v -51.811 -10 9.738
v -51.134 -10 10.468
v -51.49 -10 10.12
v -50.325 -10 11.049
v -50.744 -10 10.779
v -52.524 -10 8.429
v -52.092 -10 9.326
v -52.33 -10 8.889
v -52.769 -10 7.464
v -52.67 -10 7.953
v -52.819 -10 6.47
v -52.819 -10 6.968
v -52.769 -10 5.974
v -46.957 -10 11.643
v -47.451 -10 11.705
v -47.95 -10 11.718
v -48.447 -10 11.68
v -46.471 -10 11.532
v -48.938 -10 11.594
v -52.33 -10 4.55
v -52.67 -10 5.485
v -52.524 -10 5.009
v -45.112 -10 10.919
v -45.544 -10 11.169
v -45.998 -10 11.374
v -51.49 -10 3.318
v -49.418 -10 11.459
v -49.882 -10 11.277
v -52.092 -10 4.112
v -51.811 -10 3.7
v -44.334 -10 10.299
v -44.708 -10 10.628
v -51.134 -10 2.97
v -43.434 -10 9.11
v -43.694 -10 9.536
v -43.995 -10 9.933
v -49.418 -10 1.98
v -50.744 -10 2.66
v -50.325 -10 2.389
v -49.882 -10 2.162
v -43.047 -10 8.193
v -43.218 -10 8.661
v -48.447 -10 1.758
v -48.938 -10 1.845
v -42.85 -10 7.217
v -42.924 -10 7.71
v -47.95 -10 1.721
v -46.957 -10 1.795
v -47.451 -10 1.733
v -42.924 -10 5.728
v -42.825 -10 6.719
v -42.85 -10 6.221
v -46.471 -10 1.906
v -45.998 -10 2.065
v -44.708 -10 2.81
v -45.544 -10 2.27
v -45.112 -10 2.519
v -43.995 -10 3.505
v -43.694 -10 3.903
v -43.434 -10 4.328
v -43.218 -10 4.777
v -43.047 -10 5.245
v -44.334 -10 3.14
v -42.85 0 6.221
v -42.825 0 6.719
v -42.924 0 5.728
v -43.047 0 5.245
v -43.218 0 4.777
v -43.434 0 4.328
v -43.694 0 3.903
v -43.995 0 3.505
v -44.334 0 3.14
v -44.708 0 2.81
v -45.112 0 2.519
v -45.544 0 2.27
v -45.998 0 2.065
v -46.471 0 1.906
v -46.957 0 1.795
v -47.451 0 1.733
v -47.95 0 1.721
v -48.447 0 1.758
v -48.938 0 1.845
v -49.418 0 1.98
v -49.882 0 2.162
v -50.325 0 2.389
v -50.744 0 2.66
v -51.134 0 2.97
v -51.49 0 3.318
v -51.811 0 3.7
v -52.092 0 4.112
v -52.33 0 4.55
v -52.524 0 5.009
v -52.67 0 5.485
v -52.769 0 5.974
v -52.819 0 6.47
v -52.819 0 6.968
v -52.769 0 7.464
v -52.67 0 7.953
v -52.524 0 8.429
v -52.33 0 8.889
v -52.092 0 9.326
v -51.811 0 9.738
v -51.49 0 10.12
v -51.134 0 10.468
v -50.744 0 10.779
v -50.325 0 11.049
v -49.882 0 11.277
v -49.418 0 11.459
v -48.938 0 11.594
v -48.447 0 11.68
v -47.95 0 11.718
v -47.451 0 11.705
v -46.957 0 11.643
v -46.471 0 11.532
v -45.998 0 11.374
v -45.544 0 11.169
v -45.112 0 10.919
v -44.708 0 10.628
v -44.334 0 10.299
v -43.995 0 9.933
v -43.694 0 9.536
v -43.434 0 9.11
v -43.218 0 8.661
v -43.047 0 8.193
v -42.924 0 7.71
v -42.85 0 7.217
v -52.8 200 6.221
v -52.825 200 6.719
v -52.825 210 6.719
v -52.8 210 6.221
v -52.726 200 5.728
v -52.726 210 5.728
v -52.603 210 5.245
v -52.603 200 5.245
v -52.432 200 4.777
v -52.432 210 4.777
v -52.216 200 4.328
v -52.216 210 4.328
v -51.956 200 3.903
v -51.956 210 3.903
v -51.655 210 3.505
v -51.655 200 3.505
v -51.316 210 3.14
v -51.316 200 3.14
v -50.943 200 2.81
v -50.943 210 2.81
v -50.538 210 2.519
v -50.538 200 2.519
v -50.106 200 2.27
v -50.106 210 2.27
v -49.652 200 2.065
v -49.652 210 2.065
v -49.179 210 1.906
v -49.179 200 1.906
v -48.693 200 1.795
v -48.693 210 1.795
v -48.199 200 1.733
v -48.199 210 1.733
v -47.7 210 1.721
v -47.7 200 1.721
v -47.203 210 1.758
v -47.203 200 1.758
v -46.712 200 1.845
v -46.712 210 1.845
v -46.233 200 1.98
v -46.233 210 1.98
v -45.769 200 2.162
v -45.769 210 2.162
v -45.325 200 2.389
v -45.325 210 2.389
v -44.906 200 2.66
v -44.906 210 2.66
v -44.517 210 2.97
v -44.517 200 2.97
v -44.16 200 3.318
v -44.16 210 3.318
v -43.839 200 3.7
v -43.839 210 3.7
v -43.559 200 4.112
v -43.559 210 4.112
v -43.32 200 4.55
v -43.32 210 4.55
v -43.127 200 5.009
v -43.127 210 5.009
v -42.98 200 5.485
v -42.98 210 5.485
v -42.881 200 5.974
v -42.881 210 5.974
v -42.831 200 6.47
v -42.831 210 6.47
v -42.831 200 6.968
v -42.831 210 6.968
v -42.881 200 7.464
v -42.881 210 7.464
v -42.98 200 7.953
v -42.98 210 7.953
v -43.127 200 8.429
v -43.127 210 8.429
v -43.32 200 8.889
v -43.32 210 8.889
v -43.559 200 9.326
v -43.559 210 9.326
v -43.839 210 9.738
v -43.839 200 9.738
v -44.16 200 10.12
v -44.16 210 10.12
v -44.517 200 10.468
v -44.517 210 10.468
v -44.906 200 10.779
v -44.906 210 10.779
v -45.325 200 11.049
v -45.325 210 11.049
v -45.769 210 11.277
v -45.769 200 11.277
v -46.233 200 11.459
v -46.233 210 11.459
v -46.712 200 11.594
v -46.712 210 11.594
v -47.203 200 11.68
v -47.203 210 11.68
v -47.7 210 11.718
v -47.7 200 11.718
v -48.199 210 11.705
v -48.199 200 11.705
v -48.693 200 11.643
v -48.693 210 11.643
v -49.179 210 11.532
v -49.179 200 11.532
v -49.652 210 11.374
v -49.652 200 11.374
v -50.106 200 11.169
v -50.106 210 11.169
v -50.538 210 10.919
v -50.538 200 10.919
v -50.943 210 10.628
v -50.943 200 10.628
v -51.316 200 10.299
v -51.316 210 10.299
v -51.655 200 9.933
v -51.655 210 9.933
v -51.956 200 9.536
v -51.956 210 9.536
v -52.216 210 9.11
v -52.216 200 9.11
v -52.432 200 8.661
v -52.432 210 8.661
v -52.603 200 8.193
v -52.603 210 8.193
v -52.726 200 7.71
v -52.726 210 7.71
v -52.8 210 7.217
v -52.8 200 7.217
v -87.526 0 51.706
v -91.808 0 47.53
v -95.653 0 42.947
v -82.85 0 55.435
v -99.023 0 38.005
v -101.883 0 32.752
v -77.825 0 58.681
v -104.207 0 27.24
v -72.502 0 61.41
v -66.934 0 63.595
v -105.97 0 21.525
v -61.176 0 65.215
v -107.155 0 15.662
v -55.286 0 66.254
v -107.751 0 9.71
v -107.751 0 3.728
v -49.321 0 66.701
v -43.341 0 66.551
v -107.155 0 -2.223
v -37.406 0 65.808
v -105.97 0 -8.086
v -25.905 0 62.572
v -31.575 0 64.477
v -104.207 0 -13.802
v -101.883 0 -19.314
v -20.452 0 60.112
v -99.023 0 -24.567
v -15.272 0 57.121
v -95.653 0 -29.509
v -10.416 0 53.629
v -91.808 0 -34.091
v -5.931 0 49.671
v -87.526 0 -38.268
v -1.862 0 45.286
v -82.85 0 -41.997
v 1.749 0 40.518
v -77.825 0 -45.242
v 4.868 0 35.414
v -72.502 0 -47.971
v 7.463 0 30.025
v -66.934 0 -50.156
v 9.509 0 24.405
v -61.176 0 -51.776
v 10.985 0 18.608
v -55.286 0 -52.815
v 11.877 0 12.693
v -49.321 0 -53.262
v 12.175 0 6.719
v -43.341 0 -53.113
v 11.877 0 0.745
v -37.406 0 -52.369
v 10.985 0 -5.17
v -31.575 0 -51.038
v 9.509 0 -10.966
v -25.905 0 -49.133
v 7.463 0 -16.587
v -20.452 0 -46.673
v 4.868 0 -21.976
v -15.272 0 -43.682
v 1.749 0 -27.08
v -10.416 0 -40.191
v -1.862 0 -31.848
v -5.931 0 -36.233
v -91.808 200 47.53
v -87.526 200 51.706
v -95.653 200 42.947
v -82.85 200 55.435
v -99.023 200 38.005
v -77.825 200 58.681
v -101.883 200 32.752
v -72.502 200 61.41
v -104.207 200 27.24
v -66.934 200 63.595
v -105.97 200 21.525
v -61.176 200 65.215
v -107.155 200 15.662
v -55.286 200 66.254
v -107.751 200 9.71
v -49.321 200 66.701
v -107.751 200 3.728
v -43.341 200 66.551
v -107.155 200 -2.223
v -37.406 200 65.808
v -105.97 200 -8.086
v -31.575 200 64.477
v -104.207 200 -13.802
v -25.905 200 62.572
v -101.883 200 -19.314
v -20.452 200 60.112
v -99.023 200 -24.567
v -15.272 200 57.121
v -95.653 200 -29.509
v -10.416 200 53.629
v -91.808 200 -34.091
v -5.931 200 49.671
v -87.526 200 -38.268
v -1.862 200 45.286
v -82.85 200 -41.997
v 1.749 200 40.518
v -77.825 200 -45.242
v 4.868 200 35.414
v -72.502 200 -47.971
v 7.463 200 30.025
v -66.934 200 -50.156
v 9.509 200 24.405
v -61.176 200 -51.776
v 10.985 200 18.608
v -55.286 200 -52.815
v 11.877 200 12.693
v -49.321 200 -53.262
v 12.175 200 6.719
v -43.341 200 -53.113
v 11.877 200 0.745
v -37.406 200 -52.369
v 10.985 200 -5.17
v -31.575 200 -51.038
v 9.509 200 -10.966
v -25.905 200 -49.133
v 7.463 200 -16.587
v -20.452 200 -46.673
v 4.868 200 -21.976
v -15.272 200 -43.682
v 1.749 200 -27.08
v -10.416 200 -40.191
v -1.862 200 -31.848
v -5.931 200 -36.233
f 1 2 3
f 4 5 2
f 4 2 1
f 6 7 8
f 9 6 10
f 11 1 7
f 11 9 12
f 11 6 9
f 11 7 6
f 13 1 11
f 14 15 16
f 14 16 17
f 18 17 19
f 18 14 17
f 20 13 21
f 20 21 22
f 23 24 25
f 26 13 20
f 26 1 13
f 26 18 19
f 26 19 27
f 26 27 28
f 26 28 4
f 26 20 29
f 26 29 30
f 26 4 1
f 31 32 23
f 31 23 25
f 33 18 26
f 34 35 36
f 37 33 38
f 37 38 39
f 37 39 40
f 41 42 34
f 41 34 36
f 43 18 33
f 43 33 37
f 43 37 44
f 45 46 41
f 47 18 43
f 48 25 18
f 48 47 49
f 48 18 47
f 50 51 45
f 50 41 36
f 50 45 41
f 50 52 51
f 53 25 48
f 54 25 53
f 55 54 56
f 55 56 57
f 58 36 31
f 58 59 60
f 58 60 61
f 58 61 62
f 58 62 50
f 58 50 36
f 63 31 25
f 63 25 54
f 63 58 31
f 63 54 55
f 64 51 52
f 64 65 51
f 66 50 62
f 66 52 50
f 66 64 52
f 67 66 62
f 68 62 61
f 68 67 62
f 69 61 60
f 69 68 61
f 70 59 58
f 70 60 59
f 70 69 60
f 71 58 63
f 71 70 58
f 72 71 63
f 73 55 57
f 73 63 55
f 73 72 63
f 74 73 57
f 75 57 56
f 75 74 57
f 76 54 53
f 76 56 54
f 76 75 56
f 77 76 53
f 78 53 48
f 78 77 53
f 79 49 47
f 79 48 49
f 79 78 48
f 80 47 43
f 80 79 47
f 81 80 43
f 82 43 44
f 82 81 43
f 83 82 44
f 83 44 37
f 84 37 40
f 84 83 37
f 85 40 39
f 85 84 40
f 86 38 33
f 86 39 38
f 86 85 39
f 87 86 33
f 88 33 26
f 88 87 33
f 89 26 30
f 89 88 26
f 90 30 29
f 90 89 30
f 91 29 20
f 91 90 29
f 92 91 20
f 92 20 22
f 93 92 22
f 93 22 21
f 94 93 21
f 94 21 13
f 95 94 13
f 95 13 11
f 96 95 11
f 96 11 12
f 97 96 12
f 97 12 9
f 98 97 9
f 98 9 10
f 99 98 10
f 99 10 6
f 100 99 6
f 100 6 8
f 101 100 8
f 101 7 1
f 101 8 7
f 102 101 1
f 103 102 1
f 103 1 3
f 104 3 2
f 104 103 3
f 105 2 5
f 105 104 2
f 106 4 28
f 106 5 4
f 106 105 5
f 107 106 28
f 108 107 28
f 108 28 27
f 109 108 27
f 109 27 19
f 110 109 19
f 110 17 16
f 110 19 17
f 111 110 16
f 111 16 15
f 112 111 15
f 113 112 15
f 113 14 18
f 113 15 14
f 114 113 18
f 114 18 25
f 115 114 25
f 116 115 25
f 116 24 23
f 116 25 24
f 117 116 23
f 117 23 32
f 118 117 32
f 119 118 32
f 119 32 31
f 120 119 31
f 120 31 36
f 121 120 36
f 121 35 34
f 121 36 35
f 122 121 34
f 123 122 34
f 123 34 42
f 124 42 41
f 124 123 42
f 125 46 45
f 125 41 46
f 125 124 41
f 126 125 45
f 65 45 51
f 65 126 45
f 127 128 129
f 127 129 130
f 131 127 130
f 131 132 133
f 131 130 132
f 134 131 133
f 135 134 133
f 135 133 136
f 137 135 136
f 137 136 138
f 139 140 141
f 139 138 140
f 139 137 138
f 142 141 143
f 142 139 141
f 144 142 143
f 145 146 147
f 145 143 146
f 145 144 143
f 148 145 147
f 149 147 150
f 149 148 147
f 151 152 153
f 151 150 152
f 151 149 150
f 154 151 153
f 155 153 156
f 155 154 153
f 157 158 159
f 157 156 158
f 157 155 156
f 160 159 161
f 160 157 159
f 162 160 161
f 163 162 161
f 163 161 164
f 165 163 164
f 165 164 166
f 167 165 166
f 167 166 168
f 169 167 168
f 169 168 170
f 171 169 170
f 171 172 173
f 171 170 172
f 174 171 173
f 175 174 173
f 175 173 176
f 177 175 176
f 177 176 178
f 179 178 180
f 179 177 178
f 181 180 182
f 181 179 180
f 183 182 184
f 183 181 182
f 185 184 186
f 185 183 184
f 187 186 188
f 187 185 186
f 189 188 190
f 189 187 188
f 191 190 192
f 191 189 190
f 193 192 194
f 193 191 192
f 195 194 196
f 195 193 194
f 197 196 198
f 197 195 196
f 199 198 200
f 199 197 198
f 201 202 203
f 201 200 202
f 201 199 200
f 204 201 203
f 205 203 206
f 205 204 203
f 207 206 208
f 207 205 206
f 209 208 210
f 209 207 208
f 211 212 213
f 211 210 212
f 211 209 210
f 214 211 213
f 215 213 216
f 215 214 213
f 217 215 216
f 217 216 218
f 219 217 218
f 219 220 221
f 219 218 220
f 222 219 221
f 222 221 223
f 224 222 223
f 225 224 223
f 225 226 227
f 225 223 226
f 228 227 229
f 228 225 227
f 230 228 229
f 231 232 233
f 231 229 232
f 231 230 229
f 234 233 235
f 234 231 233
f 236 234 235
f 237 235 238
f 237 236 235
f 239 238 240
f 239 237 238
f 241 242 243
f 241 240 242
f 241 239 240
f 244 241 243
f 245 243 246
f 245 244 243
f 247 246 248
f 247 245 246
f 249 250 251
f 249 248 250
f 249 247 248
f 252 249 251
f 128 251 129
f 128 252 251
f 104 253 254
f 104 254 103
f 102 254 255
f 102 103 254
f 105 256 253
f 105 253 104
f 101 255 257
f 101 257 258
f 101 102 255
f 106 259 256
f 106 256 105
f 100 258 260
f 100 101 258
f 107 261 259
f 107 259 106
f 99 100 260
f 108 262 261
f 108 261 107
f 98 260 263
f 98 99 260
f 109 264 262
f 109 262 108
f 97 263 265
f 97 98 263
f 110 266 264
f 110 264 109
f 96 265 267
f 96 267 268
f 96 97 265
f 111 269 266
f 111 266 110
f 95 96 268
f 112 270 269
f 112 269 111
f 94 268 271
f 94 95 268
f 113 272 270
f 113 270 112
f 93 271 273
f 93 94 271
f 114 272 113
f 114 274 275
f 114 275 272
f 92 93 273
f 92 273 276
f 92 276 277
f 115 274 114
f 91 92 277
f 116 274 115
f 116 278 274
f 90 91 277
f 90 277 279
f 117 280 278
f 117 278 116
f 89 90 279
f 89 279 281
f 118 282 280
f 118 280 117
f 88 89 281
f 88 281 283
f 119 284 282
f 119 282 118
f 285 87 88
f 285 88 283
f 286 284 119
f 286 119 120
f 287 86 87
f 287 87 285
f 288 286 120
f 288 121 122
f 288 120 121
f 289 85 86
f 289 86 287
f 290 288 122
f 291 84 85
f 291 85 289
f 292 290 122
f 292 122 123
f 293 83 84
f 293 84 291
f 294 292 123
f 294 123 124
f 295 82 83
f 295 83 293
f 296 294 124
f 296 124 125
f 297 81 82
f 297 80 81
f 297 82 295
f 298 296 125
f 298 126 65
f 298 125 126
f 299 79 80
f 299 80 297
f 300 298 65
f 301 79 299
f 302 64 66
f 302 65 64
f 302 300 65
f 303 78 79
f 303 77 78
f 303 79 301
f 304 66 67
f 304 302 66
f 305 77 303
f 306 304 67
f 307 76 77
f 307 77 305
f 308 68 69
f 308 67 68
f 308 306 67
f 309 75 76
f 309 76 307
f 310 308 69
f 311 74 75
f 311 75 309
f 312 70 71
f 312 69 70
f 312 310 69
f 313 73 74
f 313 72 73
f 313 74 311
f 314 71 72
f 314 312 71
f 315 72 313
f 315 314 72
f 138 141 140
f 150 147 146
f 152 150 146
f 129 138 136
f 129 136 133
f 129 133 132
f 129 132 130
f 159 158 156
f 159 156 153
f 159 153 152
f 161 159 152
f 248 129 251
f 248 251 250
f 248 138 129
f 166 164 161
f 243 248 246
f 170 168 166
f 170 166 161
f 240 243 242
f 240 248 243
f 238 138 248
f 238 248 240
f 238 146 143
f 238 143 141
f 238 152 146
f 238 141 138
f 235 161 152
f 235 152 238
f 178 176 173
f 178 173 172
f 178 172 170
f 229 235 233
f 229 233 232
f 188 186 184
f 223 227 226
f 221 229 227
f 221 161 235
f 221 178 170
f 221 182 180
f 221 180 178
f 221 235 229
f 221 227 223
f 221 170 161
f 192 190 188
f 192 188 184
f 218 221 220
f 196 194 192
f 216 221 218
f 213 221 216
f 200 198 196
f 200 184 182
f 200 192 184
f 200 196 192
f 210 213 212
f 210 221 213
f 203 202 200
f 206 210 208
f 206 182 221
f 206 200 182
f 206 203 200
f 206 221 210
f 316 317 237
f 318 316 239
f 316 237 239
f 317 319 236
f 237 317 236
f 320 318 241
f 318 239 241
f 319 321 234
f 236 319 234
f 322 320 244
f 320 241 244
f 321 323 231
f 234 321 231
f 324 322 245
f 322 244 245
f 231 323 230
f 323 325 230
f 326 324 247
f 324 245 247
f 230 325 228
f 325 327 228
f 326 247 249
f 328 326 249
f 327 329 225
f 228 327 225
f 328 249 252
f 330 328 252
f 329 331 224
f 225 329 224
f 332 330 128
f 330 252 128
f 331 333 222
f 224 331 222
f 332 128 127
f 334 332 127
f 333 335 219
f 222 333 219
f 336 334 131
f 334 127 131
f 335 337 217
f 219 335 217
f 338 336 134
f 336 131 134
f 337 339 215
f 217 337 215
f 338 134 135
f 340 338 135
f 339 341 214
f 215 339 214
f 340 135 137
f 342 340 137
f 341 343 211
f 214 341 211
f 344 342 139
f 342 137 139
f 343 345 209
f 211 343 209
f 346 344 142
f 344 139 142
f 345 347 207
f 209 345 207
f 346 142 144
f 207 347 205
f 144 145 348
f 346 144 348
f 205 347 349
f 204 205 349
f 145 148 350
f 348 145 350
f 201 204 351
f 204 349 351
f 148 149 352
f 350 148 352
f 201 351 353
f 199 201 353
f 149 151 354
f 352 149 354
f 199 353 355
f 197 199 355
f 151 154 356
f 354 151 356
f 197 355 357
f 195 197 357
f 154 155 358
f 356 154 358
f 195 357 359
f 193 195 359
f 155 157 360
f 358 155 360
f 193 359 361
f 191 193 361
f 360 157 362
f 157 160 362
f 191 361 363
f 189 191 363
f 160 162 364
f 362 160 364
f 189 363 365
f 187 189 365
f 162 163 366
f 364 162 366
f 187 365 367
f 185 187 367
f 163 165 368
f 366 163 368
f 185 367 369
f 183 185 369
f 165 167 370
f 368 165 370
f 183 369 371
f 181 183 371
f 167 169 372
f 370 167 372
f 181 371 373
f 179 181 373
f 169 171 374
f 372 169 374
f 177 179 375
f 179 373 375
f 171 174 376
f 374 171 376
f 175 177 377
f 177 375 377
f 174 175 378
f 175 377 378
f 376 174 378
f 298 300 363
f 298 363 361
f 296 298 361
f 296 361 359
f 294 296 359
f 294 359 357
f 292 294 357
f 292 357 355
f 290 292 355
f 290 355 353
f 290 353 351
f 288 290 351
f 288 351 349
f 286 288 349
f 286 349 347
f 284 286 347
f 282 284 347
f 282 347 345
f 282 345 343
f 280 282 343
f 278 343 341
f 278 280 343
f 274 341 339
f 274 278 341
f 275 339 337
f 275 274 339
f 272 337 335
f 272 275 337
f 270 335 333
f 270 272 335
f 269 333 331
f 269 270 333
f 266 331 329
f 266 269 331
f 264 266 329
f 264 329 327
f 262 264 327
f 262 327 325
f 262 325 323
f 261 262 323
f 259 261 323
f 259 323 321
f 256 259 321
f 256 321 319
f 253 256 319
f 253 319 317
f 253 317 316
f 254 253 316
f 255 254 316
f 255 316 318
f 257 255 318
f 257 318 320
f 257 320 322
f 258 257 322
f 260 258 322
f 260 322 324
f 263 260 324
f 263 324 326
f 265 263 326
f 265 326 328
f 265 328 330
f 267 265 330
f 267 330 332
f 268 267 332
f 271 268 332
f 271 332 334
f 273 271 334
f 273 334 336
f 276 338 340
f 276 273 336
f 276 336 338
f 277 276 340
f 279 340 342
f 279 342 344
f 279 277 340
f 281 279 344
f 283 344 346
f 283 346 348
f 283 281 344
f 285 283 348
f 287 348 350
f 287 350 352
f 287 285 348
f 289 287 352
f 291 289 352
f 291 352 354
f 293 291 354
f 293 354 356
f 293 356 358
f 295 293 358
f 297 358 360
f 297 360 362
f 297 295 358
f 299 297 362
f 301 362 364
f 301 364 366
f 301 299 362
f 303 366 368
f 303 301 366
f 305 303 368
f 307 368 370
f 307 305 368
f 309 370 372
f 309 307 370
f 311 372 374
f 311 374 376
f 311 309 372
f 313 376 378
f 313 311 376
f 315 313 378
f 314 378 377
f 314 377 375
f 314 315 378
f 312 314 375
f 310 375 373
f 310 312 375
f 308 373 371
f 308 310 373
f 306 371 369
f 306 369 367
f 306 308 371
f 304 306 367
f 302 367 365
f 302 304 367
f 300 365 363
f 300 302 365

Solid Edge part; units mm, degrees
sketch "Sketch1" plane through (0, 0, 0) normal (0, -1, 0) x (1, 0, 0)
  circle A0 centre (-47.8251, 6.7192) radius 60
extrude "Protrusion1" add sketch "Sketch1" against normal blind 200
sketch "Sketch2" plane through (-47.8251, 0, 6.7192) normal (0, -1, 0) x (1, 0, 0)
  circle A0 centre (0, 0) radius 5
extrude "ExtrudedProtrusion_3" add sketch "Sketch2" along normal blind 10
sketch "Sketch3" plane through (-47.8251, 200, 6.7192) normal (0, 1, 0) x (-1, 0, 0)
  circle A0 centre (0, 0) radius 5
extrude "ExtrudedProtrusion_4" add sketch "Sketch3" along normal blind 10
